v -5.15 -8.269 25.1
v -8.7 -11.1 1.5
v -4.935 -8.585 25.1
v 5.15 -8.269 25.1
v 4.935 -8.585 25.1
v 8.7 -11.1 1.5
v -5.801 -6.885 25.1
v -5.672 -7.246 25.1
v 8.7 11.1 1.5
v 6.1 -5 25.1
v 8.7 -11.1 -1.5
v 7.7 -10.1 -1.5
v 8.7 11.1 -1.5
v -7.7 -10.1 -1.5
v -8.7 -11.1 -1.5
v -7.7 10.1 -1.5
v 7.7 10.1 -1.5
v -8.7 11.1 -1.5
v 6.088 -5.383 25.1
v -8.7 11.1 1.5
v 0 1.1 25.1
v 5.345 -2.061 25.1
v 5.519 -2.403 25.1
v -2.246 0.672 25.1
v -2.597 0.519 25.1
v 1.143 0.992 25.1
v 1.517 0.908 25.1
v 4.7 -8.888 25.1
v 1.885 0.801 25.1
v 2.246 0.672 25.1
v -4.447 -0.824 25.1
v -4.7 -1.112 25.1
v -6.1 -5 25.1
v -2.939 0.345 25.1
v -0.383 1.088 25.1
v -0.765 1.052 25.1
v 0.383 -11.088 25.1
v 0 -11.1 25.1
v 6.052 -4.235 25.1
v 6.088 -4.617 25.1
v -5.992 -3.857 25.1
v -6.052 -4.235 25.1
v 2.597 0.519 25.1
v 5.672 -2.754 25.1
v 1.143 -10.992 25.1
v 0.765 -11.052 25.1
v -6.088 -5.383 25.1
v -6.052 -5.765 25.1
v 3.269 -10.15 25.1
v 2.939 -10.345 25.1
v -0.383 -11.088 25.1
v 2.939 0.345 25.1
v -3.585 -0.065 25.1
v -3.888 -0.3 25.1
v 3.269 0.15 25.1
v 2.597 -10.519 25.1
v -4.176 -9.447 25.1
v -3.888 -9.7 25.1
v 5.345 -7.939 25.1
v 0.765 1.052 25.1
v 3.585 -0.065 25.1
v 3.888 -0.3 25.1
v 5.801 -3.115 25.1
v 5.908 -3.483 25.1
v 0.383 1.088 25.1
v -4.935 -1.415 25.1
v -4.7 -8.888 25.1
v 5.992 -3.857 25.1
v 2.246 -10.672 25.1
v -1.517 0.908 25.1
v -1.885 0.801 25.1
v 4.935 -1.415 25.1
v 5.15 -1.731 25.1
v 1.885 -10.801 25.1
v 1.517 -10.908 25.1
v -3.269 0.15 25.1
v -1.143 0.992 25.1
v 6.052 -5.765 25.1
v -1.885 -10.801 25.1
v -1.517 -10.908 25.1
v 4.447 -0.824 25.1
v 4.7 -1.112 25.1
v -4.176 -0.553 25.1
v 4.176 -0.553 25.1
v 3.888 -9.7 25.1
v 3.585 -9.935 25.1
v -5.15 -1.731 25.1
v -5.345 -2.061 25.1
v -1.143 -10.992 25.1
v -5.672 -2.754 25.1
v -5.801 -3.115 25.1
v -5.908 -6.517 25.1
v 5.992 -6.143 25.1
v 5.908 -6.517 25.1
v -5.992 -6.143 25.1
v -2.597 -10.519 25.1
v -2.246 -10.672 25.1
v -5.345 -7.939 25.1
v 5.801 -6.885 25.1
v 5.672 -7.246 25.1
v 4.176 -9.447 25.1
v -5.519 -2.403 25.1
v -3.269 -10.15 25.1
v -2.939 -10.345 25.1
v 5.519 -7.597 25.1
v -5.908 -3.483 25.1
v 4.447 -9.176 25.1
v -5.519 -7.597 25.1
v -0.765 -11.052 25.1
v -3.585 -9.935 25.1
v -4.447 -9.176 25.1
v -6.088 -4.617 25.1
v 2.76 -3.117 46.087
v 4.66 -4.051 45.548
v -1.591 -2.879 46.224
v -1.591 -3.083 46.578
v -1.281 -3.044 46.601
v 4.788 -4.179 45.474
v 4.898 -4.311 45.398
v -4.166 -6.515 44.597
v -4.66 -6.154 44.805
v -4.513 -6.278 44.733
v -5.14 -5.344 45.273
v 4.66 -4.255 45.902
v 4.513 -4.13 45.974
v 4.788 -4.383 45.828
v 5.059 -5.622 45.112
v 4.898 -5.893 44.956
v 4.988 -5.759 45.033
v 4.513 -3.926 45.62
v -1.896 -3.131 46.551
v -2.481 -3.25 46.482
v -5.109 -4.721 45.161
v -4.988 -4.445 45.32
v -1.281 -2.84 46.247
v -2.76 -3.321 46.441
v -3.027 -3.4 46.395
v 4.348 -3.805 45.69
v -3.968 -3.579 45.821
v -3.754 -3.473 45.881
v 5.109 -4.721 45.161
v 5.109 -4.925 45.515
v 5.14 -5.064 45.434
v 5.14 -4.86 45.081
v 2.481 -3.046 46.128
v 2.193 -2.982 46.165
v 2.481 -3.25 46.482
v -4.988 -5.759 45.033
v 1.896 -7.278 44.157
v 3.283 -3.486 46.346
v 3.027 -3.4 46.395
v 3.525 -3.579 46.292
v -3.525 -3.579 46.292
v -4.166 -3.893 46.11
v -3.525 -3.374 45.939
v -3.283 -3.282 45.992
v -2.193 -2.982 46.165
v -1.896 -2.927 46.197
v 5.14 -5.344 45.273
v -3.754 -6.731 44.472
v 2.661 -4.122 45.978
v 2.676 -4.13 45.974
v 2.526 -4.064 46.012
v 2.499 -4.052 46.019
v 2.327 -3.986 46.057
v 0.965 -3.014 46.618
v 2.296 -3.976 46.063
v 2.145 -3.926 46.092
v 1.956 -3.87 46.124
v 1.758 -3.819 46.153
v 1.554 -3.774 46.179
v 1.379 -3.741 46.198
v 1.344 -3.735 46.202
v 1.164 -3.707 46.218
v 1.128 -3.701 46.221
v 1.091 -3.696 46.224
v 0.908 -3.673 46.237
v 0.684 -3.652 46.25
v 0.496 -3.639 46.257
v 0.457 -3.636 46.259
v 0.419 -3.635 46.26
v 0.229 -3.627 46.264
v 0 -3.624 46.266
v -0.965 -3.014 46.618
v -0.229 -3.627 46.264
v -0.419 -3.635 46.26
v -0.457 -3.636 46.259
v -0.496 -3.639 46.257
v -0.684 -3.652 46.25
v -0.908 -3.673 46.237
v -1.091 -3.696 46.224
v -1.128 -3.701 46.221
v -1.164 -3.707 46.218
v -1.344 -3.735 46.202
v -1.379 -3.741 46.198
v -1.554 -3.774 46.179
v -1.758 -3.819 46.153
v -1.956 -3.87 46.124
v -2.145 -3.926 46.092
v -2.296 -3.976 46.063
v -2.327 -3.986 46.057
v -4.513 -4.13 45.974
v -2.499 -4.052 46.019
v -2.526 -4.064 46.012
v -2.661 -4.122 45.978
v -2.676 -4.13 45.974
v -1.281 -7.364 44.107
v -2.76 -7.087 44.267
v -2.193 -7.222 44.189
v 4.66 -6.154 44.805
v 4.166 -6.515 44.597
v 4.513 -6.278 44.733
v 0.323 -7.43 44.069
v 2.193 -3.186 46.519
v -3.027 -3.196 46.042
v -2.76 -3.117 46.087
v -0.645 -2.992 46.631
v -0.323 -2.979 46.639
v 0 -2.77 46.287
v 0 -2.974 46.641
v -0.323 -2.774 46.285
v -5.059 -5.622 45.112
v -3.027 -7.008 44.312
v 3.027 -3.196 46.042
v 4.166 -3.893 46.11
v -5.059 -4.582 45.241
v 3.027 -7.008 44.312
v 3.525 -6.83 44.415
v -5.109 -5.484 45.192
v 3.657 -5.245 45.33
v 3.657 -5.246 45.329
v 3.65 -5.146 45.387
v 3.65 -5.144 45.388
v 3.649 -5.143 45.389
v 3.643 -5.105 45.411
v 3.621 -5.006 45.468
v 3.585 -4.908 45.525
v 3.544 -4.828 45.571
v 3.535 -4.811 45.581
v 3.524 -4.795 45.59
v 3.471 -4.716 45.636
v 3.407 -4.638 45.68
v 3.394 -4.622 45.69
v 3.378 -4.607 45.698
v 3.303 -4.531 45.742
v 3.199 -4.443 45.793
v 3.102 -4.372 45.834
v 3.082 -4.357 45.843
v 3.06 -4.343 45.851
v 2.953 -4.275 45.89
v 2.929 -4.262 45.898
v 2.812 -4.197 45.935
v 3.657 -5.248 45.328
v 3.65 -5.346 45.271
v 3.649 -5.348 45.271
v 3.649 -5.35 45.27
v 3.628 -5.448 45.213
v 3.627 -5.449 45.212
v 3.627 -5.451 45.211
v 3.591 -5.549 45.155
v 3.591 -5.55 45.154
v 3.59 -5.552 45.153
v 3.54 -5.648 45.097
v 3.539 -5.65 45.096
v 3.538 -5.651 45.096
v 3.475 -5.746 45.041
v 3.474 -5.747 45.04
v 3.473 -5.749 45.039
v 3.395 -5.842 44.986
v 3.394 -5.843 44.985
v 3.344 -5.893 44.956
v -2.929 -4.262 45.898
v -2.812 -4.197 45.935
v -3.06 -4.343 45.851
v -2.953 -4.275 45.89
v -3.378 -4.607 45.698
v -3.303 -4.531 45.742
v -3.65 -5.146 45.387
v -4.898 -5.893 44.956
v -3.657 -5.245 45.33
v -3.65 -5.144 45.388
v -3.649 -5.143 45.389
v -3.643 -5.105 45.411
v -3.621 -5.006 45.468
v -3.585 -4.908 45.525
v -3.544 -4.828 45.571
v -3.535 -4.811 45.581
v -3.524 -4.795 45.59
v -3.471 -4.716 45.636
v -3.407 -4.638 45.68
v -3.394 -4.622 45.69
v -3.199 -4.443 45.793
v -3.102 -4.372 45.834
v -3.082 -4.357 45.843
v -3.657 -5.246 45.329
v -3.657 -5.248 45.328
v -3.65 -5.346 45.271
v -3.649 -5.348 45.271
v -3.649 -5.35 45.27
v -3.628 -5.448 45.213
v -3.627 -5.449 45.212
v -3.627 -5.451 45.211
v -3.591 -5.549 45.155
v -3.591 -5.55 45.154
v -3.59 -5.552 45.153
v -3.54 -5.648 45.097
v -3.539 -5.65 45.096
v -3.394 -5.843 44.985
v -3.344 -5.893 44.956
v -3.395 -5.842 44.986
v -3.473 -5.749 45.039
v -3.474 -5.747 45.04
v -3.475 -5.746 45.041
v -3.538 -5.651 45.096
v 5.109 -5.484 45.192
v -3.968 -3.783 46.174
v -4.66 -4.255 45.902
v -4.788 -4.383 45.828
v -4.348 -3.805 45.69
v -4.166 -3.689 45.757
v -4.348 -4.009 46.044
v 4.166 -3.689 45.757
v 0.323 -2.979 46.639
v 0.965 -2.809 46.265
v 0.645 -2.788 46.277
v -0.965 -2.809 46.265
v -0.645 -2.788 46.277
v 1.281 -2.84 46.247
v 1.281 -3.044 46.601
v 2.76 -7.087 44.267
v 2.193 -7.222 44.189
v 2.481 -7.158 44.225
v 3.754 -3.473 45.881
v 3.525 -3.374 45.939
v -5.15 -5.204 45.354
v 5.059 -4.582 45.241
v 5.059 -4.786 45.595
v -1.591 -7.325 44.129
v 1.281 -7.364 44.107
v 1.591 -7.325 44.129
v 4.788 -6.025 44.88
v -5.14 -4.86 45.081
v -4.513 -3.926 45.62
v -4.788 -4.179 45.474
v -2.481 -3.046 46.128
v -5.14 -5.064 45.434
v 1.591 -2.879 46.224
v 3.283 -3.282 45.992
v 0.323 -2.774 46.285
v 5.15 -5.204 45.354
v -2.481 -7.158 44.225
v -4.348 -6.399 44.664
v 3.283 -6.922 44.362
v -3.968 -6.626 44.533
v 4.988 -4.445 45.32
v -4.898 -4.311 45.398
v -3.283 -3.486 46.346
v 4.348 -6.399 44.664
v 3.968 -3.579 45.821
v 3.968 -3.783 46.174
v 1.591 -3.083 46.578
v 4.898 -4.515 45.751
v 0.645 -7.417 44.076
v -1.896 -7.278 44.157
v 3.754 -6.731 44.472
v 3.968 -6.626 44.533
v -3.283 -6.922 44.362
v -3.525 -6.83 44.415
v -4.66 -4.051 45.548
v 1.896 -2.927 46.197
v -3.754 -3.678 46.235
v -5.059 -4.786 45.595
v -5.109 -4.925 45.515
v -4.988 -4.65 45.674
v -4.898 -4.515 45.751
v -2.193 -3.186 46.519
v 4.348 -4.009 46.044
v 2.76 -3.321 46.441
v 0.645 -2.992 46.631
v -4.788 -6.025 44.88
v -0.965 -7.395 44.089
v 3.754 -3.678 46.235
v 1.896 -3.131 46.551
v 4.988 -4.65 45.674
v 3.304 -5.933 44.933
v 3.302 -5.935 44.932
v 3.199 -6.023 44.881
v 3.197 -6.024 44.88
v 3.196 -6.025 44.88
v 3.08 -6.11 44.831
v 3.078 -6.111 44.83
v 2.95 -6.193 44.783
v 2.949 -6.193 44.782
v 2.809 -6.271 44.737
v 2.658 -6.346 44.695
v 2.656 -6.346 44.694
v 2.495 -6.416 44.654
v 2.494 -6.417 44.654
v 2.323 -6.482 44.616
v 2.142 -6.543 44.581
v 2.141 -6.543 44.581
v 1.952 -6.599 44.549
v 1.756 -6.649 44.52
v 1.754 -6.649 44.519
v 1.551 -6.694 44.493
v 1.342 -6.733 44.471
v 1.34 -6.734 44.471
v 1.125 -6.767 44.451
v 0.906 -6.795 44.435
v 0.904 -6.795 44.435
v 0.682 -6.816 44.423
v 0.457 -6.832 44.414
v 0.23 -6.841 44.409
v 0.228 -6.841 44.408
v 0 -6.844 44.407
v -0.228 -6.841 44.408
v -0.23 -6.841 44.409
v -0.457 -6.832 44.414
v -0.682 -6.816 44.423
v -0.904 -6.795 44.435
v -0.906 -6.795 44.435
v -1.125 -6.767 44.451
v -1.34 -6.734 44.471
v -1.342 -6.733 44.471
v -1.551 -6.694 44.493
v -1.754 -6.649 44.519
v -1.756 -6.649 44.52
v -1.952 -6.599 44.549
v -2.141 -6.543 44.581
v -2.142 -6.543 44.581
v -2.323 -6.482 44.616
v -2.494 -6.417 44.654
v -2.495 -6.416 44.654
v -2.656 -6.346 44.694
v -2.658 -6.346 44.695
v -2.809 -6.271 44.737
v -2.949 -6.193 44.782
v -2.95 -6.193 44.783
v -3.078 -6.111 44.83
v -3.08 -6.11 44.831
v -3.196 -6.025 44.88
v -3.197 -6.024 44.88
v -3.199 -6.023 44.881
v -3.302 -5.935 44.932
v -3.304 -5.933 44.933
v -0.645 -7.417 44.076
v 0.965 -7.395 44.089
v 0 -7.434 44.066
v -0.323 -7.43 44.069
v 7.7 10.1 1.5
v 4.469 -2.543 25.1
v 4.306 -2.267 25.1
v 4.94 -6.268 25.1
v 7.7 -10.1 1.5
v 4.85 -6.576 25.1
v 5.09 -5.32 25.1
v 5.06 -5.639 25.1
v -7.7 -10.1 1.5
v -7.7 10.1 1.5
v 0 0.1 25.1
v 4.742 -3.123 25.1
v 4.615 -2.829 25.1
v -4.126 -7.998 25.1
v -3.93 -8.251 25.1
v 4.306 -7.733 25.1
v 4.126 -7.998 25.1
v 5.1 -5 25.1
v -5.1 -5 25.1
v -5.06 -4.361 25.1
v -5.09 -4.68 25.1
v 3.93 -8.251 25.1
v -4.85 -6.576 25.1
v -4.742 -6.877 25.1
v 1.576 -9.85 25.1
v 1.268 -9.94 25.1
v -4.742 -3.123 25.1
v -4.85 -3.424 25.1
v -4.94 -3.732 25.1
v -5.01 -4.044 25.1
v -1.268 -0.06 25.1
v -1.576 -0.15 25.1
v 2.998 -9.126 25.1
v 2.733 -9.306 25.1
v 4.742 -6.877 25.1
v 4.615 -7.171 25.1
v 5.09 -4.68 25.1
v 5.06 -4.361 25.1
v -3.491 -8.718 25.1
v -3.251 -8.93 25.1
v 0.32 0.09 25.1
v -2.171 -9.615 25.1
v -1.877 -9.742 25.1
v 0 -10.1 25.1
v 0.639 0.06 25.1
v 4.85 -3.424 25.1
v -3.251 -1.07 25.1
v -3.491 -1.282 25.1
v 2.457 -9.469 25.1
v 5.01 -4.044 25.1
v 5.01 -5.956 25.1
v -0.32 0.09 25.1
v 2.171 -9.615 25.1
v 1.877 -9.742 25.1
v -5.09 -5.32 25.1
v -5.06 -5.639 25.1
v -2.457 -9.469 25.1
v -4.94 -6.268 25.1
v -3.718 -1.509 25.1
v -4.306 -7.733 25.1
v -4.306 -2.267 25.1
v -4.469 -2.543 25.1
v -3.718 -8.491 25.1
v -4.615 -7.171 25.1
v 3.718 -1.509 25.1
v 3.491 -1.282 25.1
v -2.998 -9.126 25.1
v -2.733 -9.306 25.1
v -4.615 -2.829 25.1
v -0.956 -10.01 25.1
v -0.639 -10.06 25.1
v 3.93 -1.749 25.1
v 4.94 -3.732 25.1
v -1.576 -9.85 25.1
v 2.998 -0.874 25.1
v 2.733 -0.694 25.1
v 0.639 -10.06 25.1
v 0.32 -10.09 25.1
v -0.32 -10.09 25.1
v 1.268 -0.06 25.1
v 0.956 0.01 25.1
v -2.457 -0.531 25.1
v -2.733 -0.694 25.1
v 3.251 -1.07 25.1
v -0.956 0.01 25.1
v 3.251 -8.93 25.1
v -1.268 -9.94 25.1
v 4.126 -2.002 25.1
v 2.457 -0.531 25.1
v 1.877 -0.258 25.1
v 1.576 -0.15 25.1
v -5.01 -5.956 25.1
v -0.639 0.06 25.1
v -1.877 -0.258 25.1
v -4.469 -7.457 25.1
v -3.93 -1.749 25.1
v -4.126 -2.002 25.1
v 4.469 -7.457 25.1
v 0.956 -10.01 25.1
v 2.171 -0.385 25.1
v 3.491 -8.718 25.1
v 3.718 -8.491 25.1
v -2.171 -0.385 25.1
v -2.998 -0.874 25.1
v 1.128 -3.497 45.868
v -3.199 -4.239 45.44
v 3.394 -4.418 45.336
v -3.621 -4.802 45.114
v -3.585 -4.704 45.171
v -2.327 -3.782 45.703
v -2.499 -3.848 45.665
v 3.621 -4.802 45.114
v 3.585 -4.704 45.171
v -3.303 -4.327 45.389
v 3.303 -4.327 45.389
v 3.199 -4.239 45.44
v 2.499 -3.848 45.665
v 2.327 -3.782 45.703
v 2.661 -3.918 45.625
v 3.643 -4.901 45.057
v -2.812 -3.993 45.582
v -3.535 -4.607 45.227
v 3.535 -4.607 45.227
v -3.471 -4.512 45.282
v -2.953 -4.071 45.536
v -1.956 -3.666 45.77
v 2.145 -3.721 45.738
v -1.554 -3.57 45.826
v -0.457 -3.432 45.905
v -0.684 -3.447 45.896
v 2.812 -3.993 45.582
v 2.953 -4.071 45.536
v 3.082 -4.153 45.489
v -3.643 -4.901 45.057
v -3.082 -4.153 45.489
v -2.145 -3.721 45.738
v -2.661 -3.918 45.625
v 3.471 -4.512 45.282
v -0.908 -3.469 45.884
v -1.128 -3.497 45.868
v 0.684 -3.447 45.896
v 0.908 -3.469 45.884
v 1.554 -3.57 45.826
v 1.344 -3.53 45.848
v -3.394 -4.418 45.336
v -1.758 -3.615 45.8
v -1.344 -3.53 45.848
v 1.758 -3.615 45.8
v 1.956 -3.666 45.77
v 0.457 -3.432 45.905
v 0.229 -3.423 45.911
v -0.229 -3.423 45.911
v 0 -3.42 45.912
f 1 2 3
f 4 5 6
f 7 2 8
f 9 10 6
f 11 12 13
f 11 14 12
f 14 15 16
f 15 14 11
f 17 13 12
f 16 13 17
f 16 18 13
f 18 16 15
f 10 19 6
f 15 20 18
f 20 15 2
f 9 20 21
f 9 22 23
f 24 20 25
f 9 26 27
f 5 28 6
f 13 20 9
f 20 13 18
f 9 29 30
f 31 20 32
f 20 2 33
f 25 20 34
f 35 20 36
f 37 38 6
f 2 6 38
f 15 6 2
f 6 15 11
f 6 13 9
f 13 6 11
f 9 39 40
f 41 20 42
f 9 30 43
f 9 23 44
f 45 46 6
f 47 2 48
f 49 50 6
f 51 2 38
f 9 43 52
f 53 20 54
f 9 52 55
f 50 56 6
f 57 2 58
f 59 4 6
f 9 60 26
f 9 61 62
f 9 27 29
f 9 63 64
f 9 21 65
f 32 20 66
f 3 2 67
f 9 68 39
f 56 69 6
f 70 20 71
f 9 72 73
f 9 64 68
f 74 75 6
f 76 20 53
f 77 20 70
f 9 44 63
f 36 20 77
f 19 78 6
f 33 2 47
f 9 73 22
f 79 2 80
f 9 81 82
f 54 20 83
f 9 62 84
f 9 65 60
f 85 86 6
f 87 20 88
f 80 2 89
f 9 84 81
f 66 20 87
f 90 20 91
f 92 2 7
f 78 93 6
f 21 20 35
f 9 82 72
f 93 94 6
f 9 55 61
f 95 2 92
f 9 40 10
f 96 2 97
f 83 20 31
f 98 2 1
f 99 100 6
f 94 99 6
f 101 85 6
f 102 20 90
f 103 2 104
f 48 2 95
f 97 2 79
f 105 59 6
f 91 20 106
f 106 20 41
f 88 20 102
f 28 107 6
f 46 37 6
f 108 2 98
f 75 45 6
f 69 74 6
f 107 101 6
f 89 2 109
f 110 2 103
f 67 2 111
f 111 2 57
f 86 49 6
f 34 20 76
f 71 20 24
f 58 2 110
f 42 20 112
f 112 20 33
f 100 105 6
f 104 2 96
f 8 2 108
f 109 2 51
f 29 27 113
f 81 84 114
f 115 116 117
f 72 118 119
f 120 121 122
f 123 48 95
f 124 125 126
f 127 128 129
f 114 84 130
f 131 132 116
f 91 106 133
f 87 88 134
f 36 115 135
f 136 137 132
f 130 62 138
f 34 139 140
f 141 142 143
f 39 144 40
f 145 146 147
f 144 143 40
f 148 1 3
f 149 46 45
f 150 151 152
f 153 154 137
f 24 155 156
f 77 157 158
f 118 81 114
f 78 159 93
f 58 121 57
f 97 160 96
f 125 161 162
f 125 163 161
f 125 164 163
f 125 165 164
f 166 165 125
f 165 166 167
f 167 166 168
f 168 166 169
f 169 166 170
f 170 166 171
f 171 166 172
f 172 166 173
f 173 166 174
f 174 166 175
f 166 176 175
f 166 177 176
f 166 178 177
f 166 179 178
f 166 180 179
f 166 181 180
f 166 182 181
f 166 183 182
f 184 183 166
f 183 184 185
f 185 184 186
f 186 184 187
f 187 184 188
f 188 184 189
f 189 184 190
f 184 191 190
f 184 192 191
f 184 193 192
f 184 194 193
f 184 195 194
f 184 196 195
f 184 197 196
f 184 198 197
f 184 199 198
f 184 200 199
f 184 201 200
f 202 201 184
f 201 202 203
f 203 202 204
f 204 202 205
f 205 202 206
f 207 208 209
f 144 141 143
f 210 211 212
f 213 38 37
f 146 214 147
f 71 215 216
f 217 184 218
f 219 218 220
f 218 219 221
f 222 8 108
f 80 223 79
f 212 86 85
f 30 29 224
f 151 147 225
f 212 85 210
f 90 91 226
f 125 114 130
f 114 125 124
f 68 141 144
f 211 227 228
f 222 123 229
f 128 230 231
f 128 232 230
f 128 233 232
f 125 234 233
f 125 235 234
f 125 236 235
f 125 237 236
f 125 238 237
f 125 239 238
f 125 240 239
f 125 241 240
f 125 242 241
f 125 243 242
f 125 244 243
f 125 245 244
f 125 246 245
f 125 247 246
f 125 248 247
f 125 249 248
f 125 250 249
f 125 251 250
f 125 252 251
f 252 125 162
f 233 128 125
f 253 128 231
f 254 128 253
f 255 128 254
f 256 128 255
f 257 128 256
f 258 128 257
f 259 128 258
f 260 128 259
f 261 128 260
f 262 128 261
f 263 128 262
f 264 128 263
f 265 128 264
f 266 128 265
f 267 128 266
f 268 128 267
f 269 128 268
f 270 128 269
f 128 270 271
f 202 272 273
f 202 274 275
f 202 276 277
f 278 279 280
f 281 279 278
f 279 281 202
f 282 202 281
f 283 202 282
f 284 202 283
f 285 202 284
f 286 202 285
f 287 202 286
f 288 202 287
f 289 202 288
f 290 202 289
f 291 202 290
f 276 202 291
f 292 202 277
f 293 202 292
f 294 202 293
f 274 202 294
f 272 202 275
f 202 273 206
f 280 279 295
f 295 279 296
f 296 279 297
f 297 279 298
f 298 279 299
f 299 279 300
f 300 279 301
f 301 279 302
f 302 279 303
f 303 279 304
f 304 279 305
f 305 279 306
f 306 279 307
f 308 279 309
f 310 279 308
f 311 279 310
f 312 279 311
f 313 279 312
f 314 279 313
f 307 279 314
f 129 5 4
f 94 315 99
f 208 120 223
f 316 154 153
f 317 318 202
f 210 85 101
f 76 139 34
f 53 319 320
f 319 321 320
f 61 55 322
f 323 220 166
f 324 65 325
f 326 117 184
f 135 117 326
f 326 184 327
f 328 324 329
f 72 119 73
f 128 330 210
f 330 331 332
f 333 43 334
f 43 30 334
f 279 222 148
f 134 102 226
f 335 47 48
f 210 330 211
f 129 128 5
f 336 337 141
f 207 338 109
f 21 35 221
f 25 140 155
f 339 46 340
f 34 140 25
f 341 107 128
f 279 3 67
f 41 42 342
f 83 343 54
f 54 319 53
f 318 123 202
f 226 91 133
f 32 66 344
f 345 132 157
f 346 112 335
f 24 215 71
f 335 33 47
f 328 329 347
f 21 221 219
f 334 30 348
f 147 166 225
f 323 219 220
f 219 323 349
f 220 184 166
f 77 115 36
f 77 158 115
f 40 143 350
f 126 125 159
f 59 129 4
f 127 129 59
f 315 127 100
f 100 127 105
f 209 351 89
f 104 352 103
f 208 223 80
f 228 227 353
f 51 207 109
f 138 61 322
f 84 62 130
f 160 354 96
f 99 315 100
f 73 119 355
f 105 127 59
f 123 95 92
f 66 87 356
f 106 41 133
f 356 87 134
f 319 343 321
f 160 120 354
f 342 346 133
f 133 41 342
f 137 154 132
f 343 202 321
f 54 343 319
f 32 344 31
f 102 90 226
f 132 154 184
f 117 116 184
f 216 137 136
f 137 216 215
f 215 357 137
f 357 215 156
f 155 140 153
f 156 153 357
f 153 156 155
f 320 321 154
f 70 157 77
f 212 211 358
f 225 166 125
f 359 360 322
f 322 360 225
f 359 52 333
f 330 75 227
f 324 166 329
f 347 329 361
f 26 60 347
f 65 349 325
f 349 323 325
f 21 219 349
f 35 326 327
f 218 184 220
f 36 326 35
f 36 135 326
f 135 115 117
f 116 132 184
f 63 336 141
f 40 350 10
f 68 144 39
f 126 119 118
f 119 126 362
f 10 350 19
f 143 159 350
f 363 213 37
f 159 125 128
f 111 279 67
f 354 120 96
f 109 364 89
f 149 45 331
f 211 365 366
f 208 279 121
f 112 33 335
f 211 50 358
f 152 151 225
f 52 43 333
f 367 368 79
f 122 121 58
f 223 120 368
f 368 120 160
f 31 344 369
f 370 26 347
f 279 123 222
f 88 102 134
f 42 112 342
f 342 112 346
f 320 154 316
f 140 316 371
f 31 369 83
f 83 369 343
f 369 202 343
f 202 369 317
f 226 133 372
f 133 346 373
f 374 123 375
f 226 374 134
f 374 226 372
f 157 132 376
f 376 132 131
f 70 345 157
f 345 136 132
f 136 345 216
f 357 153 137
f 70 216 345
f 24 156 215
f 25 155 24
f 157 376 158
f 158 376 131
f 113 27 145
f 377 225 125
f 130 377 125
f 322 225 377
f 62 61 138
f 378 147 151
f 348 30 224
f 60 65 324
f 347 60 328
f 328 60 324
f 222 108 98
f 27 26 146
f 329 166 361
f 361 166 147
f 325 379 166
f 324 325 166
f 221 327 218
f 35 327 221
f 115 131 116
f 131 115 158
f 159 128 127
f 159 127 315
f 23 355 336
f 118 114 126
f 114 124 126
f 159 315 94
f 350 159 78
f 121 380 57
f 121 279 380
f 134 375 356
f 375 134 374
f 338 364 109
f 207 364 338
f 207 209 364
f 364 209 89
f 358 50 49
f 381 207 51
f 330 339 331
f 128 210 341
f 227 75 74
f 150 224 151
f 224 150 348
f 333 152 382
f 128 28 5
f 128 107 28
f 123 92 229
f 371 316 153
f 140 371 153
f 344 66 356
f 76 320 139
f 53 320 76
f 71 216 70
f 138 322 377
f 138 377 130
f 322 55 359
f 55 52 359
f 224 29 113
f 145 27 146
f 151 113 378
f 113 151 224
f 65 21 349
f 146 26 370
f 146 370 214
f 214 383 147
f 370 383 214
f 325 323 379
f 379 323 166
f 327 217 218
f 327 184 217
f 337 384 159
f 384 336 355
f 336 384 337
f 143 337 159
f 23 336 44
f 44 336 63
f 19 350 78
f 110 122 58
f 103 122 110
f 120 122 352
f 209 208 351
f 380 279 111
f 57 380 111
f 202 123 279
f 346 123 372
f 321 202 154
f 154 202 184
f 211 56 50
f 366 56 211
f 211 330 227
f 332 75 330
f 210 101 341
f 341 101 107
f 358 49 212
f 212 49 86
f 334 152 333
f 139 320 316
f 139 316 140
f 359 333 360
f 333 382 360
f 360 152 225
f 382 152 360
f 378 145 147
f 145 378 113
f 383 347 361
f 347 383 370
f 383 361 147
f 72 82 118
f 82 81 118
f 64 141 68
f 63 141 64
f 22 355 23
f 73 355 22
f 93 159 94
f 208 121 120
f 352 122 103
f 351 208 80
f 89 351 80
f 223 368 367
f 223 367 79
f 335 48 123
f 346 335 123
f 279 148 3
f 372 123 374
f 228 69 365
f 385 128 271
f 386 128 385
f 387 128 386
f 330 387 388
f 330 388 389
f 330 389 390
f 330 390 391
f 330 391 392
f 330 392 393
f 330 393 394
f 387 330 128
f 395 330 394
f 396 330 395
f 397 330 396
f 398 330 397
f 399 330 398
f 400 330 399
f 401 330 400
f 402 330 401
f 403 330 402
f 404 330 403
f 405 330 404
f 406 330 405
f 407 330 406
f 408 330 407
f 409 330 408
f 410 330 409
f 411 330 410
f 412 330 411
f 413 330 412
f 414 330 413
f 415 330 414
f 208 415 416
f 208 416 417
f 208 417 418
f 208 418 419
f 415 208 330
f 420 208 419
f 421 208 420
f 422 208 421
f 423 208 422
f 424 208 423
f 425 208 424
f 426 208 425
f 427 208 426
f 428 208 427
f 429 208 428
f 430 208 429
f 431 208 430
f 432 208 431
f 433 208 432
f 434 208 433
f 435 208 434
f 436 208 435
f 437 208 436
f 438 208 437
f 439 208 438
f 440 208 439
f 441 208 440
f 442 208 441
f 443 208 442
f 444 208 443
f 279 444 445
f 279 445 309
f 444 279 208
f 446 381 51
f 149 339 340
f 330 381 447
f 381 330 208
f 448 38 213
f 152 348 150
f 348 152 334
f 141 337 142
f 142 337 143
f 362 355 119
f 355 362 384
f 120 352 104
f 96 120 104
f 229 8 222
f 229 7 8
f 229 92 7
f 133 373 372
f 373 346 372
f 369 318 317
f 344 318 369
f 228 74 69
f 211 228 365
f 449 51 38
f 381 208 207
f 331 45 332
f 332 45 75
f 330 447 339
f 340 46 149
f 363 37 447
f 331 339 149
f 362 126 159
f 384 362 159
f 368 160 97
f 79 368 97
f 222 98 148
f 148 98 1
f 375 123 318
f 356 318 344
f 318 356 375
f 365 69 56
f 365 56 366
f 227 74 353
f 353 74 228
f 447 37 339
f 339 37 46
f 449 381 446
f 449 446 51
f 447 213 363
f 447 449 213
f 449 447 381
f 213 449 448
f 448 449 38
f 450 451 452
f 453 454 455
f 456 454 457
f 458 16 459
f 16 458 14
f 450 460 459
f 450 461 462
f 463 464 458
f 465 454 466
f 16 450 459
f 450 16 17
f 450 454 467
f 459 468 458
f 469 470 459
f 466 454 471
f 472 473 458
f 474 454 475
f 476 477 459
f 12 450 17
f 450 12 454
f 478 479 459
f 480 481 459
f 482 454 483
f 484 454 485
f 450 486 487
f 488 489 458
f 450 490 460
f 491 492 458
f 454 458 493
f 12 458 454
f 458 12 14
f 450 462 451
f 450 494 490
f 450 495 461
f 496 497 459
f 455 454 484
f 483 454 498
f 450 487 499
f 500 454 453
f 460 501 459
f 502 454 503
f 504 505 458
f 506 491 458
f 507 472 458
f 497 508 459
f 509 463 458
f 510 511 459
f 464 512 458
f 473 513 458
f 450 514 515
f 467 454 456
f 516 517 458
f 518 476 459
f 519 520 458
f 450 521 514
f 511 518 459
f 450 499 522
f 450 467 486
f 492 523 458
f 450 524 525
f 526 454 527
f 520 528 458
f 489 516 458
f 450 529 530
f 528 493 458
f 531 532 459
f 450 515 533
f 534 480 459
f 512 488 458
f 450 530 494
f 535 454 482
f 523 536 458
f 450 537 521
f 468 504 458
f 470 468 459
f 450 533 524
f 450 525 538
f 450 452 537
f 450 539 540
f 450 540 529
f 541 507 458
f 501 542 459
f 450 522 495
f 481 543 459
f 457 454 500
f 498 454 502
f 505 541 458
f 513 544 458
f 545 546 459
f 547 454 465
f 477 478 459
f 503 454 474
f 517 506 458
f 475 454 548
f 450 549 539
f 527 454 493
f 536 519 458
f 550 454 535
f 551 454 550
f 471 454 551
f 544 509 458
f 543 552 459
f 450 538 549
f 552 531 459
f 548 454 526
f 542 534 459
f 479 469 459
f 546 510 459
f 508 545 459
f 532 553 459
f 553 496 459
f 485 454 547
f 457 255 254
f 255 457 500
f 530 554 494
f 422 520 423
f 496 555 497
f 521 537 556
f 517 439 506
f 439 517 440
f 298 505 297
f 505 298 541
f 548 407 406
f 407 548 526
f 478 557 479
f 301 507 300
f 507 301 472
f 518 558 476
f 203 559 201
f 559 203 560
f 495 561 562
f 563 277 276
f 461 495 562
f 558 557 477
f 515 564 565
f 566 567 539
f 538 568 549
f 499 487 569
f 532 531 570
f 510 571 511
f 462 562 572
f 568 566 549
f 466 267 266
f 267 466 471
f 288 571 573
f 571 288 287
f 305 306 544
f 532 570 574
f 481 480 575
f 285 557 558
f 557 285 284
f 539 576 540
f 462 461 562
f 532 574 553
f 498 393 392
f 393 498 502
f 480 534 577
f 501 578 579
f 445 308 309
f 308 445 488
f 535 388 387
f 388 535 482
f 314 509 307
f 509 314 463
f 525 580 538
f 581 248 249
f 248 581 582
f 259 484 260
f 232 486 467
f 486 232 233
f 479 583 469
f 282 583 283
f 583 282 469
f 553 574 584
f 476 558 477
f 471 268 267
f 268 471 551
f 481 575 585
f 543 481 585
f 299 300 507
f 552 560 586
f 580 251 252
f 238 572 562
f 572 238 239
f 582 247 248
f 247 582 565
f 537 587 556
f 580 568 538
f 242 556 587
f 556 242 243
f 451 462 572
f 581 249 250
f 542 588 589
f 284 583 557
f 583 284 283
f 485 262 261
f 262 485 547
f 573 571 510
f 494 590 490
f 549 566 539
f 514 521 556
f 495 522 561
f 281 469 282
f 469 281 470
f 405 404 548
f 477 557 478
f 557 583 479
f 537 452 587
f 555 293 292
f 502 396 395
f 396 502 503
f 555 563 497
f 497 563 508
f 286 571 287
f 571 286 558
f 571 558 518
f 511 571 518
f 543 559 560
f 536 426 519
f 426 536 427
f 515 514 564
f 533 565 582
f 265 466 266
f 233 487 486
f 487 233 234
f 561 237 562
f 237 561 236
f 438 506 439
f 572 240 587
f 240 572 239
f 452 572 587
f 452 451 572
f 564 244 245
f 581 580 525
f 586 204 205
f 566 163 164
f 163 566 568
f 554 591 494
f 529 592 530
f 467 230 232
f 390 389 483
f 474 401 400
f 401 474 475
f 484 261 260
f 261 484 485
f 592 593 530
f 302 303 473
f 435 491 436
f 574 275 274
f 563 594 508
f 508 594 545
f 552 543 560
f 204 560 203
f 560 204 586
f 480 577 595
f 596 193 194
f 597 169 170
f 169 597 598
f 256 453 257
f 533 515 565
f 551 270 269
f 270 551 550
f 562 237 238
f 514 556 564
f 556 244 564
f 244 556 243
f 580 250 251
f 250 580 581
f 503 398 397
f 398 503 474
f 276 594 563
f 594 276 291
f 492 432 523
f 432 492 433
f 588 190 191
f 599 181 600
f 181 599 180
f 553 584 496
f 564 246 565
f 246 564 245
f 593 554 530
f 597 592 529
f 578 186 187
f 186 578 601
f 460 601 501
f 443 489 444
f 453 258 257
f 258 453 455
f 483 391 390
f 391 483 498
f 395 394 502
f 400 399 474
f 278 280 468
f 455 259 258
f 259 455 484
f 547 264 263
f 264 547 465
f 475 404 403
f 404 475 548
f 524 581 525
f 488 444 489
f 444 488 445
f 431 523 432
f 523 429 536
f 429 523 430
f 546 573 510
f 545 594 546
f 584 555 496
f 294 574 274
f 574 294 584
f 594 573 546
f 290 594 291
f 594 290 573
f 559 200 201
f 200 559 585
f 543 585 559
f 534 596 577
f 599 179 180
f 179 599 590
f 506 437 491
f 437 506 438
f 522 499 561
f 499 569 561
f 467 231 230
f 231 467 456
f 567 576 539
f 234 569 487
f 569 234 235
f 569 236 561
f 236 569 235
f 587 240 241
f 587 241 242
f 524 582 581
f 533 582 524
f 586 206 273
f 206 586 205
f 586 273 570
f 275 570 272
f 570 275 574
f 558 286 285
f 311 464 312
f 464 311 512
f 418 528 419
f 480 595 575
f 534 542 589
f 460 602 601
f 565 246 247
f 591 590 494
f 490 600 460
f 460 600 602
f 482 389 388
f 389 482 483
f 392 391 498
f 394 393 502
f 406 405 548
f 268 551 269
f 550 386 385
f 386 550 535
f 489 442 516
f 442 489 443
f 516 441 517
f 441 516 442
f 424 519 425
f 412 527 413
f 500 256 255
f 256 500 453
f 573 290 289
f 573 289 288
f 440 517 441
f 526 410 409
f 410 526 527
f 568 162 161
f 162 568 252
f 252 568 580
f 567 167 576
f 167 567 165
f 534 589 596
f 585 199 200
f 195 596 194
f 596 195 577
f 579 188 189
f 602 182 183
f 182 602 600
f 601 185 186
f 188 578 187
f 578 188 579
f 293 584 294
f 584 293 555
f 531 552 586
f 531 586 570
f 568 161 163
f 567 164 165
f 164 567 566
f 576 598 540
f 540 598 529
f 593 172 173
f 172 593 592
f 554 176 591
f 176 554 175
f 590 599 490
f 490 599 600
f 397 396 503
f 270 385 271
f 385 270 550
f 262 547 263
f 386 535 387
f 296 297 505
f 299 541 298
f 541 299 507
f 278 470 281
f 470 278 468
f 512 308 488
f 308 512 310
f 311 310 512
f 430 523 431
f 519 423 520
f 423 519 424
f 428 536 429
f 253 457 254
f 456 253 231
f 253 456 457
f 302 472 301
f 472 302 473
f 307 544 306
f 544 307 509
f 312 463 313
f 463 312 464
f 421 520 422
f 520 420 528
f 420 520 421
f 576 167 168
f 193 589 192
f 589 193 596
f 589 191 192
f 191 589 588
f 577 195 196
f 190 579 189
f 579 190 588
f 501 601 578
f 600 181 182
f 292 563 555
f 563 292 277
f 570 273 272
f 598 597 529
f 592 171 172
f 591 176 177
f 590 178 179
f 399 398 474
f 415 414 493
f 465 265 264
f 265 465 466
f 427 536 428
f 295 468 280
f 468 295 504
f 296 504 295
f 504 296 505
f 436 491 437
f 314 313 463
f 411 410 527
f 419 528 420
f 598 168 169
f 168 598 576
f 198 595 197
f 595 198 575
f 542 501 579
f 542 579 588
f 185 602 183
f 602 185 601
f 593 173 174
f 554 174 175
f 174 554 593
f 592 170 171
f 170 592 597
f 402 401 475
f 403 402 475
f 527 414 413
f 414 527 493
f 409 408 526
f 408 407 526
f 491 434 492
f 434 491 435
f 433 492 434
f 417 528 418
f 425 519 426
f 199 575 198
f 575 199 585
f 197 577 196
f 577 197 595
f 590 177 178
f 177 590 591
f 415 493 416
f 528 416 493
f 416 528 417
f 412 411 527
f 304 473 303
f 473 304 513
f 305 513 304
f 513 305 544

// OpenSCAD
// http://www.thingiverse.com/thing:387301
// 12/17/18 - (SRC) Added preview colors
$fn=100;

$fs=0.1;
module FanDuct() {
	tol=0.10;
	wallThickness=1;//0.8;

	module Shape(dia) {
		color("blue") hull() {
			cube([15.2+dia*2,20+dia*2,3],center=true);
			translate([0,-5,25])cylinder(h=0.1,d=10+dia*2);
		}
		color("red") hull() {
			translate([0,-5,25])cylinder(h=0.1,d=10+dia*2);
			translate([0,-5,45])rotate([30,0,0])scale([1.0,0.5,1])cylinder(h=0.5-dia/12,d=7+dia*3);
		}
	}

	difference() {
		Shape(dia=wallThickness+tol);
		Shape(dia=tol);
	}
}


FanDuct();
